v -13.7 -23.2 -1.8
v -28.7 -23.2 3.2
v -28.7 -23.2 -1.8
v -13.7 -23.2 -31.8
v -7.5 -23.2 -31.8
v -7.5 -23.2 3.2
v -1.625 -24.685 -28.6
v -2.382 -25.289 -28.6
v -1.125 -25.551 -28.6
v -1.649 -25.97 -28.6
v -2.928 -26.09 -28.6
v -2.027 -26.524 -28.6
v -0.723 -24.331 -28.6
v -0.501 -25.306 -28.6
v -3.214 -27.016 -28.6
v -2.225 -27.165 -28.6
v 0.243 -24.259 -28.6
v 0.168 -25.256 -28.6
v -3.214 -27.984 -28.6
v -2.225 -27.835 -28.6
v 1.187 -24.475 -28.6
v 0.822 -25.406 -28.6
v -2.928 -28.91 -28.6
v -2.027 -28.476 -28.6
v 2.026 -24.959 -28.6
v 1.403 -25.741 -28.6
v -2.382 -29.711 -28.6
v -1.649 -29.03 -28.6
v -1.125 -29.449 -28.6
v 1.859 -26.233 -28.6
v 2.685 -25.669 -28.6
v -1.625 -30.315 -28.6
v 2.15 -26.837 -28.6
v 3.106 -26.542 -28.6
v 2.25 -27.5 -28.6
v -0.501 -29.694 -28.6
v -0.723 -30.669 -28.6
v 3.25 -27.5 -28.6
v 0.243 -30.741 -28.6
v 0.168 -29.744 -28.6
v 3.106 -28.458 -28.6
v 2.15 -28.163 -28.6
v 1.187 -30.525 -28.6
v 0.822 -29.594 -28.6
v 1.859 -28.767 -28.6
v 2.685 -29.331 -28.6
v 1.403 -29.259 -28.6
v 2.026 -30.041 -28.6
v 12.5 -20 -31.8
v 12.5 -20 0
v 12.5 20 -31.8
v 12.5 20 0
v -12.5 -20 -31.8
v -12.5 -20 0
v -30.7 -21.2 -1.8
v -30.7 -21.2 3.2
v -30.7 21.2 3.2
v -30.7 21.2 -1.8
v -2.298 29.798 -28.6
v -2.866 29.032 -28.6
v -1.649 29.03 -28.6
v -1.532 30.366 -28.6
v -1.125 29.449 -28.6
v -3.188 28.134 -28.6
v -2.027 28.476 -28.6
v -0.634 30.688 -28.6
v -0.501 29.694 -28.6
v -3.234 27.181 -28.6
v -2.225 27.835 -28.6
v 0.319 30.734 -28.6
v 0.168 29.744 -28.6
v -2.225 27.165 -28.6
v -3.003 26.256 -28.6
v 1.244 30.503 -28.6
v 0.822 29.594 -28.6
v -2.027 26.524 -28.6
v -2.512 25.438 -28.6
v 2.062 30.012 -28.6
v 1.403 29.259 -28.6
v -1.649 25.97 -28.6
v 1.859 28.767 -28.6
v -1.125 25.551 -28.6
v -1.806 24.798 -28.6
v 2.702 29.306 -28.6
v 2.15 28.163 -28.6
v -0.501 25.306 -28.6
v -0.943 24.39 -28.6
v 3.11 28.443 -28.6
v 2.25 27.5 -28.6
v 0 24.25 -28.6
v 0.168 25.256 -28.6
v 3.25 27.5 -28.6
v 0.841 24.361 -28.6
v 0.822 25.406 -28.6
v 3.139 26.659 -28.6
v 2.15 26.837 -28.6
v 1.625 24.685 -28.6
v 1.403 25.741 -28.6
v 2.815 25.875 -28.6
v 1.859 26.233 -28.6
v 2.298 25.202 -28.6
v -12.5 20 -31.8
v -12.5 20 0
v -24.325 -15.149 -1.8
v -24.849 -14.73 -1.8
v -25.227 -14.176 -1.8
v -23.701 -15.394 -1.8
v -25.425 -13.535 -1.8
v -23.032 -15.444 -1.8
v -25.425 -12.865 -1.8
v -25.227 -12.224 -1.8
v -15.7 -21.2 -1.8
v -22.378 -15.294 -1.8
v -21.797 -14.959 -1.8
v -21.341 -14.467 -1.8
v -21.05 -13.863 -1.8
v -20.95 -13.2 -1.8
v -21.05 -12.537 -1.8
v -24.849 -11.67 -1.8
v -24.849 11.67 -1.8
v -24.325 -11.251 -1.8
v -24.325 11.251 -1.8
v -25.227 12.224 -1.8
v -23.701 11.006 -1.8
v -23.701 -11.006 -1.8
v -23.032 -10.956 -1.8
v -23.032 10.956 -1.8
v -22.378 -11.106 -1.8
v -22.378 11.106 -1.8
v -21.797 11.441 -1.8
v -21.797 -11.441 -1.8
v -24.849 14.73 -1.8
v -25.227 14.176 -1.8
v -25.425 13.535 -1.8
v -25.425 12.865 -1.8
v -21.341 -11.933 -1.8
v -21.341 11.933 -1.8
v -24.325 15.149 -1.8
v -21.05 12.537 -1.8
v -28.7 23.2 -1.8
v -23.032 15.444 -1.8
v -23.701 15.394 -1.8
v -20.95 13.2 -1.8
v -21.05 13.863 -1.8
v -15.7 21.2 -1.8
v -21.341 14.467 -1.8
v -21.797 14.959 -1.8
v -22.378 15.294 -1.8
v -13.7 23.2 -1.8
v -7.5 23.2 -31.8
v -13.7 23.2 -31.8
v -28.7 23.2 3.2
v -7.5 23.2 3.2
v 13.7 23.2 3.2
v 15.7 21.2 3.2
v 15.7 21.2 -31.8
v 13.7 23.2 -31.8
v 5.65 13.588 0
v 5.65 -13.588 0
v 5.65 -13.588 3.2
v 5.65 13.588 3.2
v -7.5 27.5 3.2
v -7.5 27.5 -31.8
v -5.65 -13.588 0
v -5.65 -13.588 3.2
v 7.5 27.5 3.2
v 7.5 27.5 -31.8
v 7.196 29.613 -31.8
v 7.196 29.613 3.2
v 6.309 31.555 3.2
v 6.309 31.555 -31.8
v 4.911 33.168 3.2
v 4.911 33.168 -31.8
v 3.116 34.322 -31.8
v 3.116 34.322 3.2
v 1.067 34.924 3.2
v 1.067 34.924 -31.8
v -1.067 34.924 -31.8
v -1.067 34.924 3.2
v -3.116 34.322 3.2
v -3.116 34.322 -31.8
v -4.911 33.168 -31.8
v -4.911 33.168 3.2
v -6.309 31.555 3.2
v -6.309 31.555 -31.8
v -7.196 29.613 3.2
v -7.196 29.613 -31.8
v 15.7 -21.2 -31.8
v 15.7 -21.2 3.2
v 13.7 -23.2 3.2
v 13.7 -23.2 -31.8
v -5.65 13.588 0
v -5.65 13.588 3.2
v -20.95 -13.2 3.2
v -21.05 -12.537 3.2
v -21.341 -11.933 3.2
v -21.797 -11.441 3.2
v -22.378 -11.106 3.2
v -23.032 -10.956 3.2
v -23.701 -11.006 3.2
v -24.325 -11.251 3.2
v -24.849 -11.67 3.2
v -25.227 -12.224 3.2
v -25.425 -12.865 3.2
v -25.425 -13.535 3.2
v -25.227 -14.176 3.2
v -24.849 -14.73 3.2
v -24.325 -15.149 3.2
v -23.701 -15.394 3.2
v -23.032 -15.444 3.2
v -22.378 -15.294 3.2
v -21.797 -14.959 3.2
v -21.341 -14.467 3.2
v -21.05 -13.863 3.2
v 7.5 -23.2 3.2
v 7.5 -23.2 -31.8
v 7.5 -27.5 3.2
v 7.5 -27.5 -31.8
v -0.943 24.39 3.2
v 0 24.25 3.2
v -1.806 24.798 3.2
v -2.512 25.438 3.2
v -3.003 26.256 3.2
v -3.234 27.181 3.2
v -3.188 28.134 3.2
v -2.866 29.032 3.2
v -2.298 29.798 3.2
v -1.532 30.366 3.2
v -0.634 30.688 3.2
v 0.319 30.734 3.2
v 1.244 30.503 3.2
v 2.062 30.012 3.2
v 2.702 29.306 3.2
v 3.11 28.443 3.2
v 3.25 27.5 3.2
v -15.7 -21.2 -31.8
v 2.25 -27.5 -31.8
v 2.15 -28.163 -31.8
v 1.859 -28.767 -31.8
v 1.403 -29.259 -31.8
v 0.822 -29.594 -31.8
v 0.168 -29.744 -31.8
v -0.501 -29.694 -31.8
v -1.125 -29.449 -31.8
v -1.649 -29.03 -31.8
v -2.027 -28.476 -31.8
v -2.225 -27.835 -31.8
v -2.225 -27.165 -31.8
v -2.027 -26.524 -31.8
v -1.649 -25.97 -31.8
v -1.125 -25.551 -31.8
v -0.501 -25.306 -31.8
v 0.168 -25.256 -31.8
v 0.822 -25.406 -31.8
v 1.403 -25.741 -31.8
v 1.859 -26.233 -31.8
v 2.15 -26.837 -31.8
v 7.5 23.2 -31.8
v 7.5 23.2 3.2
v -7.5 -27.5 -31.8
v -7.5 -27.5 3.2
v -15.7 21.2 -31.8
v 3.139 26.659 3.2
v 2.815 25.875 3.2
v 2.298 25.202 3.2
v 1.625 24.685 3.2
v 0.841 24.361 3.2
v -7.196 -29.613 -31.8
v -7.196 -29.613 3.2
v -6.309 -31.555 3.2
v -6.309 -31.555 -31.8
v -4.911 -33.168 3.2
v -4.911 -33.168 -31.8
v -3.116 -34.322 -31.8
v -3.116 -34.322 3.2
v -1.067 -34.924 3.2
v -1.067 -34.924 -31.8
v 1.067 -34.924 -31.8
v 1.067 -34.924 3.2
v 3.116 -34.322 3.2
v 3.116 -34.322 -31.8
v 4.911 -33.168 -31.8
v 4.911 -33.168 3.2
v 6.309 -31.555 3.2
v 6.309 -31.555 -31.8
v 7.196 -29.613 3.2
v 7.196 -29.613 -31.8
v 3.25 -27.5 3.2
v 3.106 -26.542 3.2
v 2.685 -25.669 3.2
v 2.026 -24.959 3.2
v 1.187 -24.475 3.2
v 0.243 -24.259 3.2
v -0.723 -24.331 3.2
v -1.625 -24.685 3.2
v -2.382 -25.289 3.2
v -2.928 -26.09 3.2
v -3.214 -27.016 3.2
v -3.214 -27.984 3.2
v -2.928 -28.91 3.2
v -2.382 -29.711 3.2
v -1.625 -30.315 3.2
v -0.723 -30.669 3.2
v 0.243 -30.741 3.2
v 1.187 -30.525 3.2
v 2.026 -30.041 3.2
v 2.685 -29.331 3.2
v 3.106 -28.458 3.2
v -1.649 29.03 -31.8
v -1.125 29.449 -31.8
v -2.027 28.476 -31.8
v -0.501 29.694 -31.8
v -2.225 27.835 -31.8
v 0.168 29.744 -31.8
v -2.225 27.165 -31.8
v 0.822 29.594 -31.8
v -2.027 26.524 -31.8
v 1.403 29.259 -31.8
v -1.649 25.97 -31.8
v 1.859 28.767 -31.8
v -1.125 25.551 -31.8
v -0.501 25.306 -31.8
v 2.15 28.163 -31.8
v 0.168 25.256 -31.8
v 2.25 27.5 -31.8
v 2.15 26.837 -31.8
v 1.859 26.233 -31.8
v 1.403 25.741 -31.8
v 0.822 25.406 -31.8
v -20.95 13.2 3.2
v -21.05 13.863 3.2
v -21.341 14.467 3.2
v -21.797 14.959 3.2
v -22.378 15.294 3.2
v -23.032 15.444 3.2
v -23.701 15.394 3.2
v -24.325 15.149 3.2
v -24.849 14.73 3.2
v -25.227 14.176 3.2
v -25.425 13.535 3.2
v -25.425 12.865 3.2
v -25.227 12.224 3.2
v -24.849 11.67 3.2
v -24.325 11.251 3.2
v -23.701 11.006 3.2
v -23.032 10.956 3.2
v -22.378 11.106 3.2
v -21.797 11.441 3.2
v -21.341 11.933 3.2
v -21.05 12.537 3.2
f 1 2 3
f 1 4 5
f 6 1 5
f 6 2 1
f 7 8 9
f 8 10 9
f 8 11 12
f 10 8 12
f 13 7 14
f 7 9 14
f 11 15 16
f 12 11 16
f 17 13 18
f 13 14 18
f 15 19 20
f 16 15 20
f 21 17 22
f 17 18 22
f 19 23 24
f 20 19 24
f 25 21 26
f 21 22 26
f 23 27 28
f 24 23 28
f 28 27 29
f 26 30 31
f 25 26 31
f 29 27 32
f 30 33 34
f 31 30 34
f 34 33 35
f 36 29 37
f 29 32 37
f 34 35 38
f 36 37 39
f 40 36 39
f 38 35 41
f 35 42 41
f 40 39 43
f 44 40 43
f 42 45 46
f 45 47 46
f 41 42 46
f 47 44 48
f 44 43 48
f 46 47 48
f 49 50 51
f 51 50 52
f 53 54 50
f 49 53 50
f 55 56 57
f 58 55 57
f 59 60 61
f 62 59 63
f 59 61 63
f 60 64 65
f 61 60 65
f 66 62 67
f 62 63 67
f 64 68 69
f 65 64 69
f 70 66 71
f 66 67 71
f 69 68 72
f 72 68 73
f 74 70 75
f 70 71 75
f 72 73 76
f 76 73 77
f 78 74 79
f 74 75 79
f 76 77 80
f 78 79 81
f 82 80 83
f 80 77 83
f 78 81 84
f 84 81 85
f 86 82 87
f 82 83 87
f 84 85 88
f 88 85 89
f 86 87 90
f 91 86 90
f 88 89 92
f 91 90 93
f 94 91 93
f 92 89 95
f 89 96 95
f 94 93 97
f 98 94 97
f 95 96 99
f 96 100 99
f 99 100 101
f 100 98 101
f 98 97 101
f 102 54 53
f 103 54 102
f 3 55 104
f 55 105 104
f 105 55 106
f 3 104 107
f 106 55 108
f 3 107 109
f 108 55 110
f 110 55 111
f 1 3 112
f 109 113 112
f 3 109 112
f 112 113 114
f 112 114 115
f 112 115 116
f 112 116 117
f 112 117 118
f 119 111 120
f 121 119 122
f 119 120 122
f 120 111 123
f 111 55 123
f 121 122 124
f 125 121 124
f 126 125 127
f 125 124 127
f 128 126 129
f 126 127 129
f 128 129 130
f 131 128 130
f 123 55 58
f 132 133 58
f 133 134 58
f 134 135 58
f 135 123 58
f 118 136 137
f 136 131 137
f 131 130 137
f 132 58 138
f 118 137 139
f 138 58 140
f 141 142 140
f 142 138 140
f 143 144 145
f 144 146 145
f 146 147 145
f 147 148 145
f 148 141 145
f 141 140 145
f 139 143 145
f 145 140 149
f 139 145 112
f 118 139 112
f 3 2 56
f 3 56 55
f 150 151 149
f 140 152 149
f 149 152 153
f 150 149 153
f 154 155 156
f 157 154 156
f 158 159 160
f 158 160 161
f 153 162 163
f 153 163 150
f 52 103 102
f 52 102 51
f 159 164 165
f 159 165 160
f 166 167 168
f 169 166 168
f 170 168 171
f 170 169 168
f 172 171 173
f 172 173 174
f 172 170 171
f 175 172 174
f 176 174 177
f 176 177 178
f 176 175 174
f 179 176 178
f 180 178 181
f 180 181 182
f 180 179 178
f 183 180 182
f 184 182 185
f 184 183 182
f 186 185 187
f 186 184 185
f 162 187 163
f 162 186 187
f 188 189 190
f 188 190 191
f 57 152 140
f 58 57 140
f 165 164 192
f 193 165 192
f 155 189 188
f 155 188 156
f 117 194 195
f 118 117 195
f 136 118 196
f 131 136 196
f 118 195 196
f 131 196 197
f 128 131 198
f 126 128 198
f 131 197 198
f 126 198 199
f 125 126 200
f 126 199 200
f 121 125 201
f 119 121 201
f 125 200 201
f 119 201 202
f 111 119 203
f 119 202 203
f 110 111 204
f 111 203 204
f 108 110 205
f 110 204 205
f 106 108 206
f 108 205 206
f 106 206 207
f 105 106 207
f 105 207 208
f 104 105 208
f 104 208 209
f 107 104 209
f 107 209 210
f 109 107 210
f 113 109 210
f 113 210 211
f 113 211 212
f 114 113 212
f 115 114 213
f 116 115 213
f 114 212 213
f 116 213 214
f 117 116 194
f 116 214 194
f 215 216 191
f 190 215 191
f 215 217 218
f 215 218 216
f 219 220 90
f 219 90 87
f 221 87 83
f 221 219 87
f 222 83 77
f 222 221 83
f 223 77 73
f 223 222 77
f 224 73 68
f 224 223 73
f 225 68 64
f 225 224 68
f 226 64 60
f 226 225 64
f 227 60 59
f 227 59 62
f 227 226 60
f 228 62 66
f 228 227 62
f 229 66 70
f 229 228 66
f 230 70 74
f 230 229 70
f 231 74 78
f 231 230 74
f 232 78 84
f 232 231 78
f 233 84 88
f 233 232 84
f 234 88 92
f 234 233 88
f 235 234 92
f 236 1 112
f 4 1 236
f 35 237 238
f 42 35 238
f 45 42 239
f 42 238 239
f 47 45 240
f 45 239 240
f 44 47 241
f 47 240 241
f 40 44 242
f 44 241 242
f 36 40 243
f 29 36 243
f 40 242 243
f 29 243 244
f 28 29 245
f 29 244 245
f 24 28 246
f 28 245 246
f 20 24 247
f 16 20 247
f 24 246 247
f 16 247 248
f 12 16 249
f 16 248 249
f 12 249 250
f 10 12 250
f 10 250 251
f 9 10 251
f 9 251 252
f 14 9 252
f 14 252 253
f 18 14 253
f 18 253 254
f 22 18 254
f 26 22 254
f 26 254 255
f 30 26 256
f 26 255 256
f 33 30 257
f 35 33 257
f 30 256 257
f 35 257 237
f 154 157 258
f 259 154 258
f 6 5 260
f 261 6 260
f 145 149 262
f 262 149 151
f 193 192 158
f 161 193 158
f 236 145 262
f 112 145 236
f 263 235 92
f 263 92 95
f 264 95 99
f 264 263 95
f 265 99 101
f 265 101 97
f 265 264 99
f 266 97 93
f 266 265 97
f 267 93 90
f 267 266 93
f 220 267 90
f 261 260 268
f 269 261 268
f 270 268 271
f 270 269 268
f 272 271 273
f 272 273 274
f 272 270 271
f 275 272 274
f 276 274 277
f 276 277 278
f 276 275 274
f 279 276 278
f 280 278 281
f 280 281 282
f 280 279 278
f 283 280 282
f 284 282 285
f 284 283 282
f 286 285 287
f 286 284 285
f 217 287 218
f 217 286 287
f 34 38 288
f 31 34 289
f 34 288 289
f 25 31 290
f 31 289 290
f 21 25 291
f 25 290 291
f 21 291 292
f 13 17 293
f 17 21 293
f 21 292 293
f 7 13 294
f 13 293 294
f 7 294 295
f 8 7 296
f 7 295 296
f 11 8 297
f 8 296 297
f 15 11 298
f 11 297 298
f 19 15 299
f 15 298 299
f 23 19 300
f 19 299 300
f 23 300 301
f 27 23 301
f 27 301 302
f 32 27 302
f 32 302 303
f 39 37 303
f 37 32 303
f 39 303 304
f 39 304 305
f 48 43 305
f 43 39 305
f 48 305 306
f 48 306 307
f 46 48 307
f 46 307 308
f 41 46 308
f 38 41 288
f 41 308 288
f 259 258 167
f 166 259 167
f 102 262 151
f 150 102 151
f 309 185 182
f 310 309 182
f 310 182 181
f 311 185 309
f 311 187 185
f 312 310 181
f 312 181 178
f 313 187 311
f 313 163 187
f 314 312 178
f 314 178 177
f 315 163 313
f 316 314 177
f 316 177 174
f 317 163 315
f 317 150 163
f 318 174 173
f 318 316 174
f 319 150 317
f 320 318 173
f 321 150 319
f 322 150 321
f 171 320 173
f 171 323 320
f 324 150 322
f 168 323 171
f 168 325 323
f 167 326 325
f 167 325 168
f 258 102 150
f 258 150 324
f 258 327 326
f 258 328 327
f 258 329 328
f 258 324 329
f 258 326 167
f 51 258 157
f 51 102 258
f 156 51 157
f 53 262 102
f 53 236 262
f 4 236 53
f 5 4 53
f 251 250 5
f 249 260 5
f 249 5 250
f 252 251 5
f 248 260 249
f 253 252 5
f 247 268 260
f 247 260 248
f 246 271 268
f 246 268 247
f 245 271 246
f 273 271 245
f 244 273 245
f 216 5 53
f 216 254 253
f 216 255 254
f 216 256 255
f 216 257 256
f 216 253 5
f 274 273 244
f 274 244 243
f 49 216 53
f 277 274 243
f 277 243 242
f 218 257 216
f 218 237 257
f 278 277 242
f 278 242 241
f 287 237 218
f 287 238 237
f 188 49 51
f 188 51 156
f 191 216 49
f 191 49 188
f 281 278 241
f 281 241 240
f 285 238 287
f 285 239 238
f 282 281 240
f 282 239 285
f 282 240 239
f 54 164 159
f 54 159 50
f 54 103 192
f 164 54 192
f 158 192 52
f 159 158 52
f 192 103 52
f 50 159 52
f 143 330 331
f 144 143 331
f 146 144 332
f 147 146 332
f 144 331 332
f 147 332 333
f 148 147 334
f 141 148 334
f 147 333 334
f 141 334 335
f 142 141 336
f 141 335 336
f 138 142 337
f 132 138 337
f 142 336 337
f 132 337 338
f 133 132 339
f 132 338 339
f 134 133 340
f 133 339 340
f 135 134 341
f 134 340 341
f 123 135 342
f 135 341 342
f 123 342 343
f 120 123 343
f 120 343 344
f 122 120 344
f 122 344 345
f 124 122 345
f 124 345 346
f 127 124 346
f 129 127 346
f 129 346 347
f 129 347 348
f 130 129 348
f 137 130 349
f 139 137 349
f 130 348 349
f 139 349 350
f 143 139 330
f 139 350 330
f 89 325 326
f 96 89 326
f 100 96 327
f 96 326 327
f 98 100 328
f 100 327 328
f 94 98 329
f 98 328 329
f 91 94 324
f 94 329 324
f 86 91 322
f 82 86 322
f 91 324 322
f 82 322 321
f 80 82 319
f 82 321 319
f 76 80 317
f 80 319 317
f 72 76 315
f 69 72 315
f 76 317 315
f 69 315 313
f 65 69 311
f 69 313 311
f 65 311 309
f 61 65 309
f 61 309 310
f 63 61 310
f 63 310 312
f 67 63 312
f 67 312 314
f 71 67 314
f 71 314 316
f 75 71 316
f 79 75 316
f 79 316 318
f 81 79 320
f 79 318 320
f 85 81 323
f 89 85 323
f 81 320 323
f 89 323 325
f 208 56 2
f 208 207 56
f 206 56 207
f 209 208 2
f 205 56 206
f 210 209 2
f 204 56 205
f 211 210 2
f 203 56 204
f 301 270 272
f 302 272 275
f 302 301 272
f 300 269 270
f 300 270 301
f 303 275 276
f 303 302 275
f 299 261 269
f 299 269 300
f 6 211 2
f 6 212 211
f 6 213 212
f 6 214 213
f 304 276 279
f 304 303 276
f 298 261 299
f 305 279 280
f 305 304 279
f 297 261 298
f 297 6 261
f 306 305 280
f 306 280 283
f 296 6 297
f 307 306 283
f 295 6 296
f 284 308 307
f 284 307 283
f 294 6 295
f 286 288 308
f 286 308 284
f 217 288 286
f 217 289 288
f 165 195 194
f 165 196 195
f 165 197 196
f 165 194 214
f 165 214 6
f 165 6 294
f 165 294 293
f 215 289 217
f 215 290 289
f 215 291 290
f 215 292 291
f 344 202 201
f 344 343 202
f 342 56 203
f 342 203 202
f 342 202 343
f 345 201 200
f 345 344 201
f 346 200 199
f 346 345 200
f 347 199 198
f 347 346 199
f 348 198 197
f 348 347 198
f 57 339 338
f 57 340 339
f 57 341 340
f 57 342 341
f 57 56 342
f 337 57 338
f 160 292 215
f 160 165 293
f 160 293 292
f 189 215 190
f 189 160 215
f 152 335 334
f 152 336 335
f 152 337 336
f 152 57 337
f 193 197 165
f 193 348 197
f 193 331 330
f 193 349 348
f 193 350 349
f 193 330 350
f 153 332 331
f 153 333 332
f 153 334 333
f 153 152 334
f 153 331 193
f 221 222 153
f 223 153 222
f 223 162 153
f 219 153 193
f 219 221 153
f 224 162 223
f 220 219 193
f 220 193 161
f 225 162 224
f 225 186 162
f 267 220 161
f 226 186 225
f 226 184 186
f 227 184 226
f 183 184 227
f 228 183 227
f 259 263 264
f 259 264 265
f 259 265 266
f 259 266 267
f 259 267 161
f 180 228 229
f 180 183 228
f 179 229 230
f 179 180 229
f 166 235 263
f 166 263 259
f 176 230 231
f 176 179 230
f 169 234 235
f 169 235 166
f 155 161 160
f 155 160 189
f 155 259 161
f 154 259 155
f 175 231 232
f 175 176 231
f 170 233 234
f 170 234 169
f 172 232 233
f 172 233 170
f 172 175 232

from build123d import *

# Parameters (mm, degrees)
F0_W     = 25
F0_H     = 40
F0_W_2   = 11.3
F0_H_2   = 27.175
F1_DEPTH = 3.2
F2_R     = 3.25
F2_W     = 25
F2_H     = 40
F3_DEPTH = 35
F4_W     = 15
F4_H     = 46.4
F4_R     = 2.25
F5_DEPTH = 5
F6_SIZE  = 2
F7_R     = 3.25
F7_R_2   = 2.25
F8_DEPTH = 3.2


with BuildPart() as f1:
    # F0 (on Top) → F1 (new body)
    with BuildSketch(Plane.XY):
        Rectangle(F0_W, F0_H)
        Rectangle(F0_W_2, F0_H_2, mode=Mode.SUBTRACT)
    extrude(amount=F1_DEPTH)

    # F2 (on face) → F3 (join)
    with BuildSketch(Plane.XY.offset(3.2)):
        with BuildLine():
            Line((15.7, -23.2), (15.7, 23.2))
            Line((15.7, 23.2), (7.5, 23.2))
            Line((7.5, 23.2), (7.5, 27.5))
            ThreePointArc((7.5, 27.5), (0, 35), (-7.5, 27.5))
            Line((-7.5, 27.5), (-7.5, 23.2))
            Line((-7.5, 23.2), (-15.7, 23.2))
            Line((-15.7, 23.2), (-15.7, -23.2))
            Line((-15.7, -23.2), (-7.5, -23.2))
            Line((-7.5, -23.2), (-7.5, -27.5))
            ThreePointArc((-7.5, -27.5), (0, -35), (7.5, -27.5))
            Line((7.5, -27.5), (7.5, -23.2))
            Line((7.5, -23.2), (15.7, -23.2))
        make_face()
        with Locations((0, -27.5)):
            Circle(F2_R, mode=Mode.SUBTRACT)
        Rectangle(F2_W, F2_H, mode=Mode.SUBTRACT)
        with BuildLine():
            ThreePointArc((0, 24.25), (-2.2980970389, 29.7980970389), (3.25, 27.5))
            ThreePointArc((3.25, 27.5), (2.2980970389, 25.2019029611), (0, 24.25))
        make_face(mode=Mode.SUBTRACT)
    extrude(amount=-F3_DEPTH)

    # F4 (on face) → F5 (join)
    with BuildSketch(Plane.XY.offset(3.2)):
        with Locations((-23.2, 0)):
            Rectangle(F4_W, F4_H)
        with Locations((-23.2, -13.2)):
            Circle(F4_R, mode=Mode.SUBTRACT)
        with Locations((-23.2, 13.2)):
            Circle(F4_R, mode=Mode.SUBTRACT)
    extrude(amount=-F5_DEPTH)

    # F6
    f6_edges = [f1.edges().sort_by_distance(p)[0] for p in [
        (15.7, 23.2, -14.3),
        (-15.7, 23.2, -16.8),
        (-15.7, -23.2, -16.8),
        (15.7, -23.2, -14.3),
        (-30.7, 23.2, 0.7),
        (-30.7, -23.2, 0.7),
    ]]
    chamfer(f6_edges, length=F6_SIZE)

    # F7 (on face) → F8 (join)
    with BuildSketch(Plane(origin=(0, 0, -31.8), x_dir=(1, 0, 0), z_dir=(0, 0, -1))):
        with Locations((0, -27.5)):
            Circle(F7_R)
        with Locations((0, -27.5)):
            Circle(F7_R_2, mode=Mode.SUBTRACT)
        with Locations((0, 27.5)):
            Circle(F7_R)
        with Locations((0, 27.5)):
            Circle(F7_R_2, mode=Mode.SUBTRACT)
    extrude(amount=-F8_DEPTH)


solid = f1.part
